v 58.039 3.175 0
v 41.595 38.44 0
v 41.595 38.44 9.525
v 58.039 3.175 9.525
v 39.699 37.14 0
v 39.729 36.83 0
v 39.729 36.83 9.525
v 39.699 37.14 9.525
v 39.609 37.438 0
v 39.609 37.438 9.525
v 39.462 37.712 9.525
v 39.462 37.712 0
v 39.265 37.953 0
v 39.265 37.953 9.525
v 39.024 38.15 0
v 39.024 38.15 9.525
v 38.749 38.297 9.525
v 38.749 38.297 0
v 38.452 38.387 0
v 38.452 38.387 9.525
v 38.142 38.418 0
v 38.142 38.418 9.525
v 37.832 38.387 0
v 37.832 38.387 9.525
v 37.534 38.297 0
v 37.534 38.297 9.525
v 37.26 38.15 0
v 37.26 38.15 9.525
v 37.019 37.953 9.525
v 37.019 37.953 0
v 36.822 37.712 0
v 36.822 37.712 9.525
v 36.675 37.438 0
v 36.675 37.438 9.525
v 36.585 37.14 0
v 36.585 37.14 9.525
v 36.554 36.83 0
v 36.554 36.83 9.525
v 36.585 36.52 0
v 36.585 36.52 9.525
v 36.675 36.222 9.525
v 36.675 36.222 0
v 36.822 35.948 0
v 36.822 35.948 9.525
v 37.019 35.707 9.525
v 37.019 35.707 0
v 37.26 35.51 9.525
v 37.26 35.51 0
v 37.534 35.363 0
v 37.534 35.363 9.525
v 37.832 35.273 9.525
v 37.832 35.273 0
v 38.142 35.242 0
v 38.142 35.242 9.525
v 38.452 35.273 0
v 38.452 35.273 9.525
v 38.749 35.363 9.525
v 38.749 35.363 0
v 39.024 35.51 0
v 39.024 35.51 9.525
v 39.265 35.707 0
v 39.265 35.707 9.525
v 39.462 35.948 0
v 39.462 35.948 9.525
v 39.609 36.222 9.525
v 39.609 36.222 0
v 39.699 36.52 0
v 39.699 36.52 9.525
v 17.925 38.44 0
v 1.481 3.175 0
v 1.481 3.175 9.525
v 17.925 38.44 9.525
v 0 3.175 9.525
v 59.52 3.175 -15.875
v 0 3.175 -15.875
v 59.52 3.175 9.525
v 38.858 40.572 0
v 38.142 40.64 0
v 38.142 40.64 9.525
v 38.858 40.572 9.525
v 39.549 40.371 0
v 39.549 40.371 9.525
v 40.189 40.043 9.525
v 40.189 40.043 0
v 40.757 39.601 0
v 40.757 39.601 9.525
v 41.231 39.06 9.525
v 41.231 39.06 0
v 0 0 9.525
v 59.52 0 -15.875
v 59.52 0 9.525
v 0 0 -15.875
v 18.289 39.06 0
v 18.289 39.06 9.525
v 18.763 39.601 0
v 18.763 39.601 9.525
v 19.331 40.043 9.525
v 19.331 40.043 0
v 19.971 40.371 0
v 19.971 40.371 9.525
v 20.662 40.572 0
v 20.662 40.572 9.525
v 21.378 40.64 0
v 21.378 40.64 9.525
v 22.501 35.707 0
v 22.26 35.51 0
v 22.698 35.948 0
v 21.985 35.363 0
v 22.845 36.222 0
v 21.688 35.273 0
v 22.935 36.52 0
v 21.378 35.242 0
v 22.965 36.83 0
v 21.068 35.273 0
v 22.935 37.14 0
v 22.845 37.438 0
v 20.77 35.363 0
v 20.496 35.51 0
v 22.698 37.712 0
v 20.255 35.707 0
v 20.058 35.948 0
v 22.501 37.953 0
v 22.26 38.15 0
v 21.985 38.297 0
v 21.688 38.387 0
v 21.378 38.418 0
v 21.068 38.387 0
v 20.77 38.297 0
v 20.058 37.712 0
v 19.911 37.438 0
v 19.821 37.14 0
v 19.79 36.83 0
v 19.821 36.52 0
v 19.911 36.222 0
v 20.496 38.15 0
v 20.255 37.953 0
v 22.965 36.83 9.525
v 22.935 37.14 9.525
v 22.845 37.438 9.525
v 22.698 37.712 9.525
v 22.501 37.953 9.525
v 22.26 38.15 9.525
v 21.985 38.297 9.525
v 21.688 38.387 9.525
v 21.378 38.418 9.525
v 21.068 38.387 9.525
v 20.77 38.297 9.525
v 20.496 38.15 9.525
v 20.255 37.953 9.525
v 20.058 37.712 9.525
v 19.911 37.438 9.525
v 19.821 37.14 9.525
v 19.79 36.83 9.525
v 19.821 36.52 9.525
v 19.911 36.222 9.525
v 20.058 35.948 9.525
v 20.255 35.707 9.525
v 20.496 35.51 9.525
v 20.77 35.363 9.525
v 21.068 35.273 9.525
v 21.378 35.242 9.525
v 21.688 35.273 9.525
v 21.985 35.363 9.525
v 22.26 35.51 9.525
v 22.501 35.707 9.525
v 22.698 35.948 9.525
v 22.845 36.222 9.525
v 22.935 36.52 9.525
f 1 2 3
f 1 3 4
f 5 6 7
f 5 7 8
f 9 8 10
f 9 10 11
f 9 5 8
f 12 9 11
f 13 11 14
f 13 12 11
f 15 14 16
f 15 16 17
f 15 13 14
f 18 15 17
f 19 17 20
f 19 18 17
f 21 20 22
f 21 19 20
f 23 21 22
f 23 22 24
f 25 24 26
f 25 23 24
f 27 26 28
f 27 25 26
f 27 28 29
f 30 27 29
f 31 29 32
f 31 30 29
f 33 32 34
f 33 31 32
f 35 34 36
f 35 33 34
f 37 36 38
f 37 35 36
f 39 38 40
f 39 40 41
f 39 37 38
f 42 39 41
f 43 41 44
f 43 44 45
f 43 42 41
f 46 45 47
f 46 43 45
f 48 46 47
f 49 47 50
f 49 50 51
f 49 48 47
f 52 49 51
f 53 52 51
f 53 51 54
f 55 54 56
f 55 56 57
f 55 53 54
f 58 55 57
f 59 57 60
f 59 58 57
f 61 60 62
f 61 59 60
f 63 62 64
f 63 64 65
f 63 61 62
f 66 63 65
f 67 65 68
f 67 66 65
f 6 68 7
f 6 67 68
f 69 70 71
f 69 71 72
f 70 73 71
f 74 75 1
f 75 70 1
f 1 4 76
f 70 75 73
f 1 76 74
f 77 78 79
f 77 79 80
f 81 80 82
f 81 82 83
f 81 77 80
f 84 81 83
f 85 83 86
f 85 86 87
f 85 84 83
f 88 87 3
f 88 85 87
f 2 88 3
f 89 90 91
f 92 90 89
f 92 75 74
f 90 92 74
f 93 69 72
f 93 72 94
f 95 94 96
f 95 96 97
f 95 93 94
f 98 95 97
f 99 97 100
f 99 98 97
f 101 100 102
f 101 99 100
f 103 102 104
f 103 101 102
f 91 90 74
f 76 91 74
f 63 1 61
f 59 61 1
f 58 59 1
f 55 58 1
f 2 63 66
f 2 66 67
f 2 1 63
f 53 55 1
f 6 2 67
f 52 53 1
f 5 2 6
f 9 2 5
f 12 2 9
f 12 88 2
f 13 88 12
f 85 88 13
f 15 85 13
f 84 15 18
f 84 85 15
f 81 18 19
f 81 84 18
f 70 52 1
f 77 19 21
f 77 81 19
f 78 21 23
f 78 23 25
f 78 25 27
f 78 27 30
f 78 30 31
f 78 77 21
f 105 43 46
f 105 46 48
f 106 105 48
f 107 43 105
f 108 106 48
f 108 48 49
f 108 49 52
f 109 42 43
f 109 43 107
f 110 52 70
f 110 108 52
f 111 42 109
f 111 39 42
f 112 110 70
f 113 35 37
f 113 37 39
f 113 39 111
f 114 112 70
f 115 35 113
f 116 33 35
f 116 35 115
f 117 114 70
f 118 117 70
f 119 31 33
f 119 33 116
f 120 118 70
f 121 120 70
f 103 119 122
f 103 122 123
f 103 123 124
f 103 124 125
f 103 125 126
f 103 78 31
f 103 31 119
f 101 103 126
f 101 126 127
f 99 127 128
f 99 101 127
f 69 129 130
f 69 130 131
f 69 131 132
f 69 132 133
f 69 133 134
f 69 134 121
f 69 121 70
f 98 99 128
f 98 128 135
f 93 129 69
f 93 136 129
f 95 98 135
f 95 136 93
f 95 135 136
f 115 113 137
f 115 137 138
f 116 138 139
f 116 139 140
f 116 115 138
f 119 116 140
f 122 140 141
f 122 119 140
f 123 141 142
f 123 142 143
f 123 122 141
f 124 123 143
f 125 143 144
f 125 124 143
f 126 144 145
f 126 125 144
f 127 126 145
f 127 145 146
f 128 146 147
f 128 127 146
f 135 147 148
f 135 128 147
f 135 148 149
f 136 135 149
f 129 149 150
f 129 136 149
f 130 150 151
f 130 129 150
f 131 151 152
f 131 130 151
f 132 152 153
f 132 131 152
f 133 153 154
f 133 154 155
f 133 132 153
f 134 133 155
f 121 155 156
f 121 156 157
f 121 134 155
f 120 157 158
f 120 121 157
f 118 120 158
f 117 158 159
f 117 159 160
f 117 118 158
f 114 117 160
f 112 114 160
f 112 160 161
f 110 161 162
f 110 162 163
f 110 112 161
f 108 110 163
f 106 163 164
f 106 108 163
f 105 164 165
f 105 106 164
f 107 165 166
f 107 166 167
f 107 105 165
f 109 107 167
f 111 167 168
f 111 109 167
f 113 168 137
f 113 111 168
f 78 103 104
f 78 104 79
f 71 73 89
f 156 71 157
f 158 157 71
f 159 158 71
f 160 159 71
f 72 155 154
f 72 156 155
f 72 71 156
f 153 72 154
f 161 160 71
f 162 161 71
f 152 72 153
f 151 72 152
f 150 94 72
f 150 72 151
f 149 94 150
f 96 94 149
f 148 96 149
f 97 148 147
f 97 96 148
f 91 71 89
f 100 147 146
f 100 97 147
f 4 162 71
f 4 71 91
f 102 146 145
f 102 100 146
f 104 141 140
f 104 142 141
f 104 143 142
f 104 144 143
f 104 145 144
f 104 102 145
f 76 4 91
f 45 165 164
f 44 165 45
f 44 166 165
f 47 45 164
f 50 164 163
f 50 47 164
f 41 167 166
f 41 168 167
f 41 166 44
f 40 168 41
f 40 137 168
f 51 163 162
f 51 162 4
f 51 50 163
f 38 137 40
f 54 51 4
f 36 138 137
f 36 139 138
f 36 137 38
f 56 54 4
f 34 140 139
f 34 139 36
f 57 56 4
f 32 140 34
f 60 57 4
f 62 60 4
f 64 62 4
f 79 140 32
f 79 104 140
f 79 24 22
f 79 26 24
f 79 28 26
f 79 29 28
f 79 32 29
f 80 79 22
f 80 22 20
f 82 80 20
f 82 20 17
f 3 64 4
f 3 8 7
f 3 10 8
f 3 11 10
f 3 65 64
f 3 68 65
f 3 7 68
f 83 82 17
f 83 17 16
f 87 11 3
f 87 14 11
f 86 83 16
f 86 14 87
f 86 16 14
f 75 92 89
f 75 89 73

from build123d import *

# Parameters (mm, degrees)
SKETCH1_R           = 1.5875
BOSS_EXTRUDE1_DEPTH = 9.525
SKETCH2_W           = 59.519961842
SKETCH2_H           = 3.175
BOSS_EXTRUDE2_DEPTH = 25.4


with BuildPart() as part:
    # Sketch1 → Boss-Extrude1 (new body)
    with BuildSketch(Plane.XY):
        with BuildLine():
            Line((0, 0), (17.924948252, 38.440175577))
            ThreePointArc((17.924948252, 38.440175577), (19.330869413, 40.043321409), (21.377980921, 40.64))
            Line((21.377980921, 40.64), (38.141980921, 40.64))
            ThreePointArc((38.141980921, 40.64), (40.189092429, 40.043321409), (41.59501359, 38.440175577))
            Line((41.59501359, 38.440175577), (59.519961842, 0))
            Line((59.519961842, 0), (0, 0))
        make_face()
        with Locations((21.377980921, 36.83)):
            Circle(SKETCH1_R, mode=Mode.SUBTRACT)
        with Locations((38.141980921, 36.83)):
            Circle(SKETCH1_R, mode=Mode.SUBTRACT)
    extrude(amount=BOSS_EXTRUDE1_DEPTH)

    # Sketch2 → Boss-Extrude2 (add)
    with BuildSketch(Plane.XY.offset(9.525)):
        with Locations((29.759980921, 1.5875)):
            Rectangle(SKETCH2_W, SKETCH2_H)
    extrude(amount=-BOSS_EXTRUDE2_DEPTH)


solid = part.part
